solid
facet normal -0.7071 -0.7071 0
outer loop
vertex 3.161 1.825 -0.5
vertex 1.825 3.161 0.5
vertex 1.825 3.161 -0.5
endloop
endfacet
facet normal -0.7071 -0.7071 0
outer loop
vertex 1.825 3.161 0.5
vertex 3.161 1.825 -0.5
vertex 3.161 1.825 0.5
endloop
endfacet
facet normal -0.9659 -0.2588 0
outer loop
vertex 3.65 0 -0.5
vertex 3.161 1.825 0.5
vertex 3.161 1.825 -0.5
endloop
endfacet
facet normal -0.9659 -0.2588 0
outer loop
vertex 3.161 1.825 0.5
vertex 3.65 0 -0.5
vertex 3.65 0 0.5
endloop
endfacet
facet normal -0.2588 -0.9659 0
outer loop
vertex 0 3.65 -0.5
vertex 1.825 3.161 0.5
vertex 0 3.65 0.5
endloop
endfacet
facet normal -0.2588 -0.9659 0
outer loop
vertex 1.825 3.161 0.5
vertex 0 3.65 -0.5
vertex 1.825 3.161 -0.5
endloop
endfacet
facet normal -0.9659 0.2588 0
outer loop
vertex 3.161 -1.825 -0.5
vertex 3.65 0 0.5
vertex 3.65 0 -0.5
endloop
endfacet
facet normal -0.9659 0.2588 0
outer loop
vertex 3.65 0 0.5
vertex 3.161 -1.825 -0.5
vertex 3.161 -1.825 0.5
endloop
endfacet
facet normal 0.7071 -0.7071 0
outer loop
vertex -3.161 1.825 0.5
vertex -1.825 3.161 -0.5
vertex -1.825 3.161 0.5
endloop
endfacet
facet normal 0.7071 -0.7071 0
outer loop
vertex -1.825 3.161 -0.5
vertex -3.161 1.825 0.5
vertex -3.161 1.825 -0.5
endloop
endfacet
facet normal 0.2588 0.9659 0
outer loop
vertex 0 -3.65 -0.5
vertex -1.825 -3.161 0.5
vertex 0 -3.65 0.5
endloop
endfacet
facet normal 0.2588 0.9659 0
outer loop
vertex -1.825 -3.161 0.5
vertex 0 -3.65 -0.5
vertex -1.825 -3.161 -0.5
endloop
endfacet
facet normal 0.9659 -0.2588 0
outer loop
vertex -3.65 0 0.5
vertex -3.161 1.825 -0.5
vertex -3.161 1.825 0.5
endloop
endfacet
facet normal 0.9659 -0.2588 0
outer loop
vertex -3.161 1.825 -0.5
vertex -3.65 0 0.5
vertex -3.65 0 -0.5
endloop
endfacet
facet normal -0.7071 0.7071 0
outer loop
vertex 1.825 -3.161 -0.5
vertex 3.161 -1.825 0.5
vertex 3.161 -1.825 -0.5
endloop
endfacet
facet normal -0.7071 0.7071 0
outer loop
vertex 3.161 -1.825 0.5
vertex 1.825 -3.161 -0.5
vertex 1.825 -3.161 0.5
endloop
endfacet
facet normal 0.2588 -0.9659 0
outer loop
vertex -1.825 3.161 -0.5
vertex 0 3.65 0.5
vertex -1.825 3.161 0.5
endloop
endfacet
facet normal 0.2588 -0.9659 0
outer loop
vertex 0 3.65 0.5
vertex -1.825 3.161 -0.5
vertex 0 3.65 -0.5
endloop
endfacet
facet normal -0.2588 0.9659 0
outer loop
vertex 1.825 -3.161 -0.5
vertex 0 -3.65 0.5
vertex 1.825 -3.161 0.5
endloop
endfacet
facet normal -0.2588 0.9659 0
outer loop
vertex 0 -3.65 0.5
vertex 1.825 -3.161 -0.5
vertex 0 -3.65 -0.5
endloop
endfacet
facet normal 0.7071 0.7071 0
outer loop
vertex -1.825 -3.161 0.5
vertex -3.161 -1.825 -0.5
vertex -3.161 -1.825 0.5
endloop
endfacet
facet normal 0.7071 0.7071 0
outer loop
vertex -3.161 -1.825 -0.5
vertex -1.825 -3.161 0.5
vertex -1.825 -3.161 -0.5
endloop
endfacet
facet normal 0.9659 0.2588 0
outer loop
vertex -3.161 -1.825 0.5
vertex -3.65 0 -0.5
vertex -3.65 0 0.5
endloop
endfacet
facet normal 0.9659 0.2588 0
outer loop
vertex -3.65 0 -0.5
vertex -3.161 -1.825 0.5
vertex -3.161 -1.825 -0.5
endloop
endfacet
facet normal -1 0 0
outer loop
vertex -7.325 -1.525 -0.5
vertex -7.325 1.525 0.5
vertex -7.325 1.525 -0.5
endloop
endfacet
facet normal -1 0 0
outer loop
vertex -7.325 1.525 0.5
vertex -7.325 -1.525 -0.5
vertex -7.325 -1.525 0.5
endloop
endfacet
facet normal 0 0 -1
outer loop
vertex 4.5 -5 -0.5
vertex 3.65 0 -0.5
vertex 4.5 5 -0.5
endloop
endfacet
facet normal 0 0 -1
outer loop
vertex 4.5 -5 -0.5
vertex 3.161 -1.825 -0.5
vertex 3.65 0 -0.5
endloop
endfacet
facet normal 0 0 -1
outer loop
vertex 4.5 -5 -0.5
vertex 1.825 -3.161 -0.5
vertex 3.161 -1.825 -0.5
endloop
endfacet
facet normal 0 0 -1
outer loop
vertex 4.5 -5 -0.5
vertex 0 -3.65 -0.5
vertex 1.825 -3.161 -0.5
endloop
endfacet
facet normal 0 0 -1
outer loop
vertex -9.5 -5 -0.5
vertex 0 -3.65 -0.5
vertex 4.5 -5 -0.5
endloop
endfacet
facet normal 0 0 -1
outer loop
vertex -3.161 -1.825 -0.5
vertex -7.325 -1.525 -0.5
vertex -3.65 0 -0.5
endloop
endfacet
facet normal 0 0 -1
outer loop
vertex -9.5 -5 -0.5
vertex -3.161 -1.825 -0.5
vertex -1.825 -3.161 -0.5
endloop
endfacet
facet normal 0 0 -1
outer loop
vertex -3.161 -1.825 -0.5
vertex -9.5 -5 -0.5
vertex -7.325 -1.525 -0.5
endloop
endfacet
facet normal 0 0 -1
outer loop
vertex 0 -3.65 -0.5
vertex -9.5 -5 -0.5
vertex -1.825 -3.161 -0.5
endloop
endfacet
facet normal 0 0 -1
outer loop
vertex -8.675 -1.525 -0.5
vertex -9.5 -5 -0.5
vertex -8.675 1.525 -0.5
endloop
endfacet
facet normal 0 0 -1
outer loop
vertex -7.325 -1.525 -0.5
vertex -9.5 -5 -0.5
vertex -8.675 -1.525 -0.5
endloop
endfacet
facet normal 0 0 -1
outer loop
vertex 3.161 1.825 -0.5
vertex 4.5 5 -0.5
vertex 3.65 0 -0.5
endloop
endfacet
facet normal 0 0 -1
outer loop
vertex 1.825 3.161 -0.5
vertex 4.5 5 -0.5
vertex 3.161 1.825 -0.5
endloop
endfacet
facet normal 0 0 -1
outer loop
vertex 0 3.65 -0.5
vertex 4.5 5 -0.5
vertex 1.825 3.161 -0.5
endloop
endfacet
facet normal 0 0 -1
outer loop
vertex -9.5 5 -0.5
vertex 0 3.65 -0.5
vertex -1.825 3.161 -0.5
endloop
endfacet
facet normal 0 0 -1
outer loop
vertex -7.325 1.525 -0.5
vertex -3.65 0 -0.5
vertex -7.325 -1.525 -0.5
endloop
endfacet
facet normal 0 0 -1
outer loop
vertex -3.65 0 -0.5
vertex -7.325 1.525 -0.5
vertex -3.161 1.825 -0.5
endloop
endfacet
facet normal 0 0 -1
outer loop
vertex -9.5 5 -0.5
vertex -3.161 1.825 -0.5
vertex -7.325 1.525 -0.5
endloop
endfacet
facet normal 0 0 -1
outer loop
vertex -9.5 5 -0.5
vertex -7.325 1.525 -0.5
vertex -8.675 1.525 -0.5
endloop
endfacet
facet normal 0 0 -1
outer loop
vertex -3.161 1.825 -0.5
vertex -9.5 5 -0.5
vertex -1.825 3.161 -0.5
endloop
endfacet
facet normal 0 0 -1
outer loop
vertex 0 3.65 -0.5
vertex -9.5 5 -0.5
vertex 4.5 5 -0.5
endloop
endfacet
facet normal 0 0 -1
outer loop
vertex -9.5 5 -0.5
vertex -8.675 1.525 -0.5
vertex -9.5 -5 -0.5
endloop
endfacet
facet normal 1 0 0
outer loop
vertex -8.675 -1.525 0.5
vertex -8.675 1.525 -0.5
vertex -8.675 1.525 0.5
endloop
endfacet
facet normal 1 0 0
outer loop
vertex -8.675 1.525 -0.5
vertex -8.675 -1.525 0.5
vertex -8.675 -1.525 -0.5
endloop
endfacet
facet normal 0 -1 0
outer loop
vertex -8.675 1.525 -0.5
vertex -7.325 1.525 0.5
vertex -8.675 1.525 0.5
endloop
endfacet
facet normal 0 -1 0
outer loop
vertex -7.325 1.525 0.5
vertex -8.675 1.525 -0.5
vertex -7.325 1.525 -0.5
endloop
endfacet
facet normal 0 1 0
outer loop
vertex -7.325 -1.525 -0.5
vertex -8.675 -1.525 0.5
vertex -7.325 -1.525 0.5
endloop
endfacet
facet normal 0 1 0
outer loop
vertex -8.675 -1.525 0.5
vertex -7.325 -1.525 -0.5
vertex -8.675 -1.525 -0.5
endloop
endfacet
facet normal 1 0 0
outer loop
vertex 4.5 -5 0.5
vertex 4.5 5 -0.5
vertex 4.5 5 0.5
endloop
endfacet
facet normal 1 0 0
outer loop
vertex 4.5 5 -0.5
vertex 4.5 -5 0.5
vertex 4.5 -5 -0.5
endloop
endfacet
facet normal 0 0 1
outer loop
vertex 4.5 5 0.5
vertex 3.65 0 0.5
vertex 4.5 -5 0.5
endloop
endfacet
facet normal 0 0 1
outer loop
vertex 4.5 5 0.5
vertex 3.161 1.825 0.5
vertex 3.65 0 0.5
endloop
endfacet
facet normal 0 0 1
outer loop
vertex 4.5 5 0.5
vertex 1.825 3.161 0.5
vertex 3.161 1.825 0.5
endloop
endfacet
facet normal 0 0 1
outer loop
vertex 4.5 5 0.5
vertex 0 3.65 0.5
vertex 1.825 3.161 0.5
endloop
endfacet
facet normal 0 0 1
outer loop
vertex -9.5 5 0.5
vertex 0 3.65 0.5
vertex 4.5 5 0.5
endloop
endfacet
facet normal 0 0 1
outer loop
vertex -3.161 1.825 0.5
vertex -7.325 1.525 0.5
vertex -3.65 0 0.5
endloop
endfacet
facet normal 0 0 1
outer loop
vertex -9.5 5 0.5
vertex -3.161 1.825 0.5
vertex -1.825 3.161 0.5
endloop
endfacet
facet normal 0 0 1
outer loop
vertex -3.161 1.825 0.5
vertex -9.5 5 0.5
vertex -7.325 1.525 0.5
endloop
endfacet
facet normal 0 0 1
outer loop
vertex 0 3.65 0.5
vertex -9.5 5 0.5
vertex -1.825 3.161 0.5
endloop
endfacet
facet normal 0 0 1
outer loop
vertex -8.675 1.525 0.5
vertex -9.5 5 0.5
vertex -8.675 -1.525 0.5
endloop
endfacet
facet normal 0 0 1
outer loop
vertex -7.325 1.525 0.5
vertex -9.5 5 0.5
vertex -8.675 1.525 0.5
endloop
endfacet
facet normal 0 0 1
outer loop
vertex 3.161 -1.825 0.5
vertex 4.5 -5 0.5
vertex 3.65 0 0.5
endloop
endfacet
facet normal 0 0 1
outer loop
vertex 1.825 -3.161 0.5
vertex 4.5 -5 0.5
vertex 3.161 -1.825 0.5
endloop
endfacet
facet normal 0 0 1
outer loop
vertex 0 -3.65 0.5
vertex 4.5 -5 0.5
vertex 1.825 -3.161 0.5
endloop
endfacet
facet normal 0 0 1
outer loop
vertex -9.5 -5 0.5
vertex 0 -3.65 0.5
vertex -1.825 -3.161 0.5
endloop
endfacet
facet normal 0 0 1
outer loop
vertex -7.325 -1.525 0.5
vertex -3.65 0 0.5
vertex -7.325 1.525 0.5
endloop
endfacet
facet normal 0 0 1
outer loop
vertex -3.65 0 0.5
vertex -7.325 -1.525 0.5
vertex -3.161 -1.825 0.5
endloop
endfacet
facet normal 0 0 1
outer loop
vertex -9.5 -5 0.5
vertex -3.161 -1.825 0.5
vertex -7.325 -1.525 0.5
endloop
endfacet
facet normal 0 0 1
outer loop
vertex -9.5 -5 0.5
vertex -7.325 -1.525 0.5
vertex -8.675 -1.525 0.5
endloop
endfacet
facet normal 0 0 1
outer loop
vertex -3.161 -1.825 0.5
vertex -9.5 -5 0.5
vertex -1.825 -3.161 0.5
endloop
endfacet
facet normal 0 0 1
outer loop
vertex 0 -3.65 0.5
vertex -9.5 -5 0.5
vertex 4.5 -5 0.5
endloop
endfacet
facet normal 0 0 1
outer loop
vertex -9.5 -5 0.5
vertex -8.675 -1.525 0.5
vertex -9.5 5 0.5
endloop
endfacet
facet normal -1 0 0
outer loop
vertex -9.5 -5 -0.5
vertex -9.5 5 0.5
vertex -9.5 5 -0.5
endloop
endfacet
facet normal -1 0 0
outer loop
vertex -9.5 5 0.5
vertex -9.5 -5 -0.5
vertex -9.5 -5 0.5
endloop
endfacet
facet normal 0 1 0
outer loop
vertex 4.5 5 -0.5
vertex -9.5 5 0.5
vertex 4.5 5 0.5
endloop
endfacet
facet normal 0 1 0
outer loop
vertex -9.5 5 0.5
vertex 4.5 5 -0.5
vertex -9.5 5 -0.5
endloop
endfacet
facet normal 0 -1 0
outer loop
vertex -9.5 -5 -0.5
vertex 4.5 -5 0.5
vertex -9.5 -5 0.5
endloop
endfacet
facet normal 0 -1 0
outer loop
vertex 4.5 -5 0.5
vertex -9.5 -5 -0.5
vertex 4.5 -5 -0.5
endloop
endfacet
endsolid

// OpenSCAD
/*

cd /Users/d/Desktop/3dprint/ImplicitCad/
~/.cabal/bin/extopenscad pot4.scad

*/

$res=0.15;

module pot() {
	cylinder(r=3.65, h=5, center = true);
	translate([-8, 0, 0.75])
	cube(size = [1.35, 3.05, 2.5], center = true);
}

difference(){
    translate([-2.5,0,0])
	cube(size = [14, 10, 1], center = true);
	pot();
}
